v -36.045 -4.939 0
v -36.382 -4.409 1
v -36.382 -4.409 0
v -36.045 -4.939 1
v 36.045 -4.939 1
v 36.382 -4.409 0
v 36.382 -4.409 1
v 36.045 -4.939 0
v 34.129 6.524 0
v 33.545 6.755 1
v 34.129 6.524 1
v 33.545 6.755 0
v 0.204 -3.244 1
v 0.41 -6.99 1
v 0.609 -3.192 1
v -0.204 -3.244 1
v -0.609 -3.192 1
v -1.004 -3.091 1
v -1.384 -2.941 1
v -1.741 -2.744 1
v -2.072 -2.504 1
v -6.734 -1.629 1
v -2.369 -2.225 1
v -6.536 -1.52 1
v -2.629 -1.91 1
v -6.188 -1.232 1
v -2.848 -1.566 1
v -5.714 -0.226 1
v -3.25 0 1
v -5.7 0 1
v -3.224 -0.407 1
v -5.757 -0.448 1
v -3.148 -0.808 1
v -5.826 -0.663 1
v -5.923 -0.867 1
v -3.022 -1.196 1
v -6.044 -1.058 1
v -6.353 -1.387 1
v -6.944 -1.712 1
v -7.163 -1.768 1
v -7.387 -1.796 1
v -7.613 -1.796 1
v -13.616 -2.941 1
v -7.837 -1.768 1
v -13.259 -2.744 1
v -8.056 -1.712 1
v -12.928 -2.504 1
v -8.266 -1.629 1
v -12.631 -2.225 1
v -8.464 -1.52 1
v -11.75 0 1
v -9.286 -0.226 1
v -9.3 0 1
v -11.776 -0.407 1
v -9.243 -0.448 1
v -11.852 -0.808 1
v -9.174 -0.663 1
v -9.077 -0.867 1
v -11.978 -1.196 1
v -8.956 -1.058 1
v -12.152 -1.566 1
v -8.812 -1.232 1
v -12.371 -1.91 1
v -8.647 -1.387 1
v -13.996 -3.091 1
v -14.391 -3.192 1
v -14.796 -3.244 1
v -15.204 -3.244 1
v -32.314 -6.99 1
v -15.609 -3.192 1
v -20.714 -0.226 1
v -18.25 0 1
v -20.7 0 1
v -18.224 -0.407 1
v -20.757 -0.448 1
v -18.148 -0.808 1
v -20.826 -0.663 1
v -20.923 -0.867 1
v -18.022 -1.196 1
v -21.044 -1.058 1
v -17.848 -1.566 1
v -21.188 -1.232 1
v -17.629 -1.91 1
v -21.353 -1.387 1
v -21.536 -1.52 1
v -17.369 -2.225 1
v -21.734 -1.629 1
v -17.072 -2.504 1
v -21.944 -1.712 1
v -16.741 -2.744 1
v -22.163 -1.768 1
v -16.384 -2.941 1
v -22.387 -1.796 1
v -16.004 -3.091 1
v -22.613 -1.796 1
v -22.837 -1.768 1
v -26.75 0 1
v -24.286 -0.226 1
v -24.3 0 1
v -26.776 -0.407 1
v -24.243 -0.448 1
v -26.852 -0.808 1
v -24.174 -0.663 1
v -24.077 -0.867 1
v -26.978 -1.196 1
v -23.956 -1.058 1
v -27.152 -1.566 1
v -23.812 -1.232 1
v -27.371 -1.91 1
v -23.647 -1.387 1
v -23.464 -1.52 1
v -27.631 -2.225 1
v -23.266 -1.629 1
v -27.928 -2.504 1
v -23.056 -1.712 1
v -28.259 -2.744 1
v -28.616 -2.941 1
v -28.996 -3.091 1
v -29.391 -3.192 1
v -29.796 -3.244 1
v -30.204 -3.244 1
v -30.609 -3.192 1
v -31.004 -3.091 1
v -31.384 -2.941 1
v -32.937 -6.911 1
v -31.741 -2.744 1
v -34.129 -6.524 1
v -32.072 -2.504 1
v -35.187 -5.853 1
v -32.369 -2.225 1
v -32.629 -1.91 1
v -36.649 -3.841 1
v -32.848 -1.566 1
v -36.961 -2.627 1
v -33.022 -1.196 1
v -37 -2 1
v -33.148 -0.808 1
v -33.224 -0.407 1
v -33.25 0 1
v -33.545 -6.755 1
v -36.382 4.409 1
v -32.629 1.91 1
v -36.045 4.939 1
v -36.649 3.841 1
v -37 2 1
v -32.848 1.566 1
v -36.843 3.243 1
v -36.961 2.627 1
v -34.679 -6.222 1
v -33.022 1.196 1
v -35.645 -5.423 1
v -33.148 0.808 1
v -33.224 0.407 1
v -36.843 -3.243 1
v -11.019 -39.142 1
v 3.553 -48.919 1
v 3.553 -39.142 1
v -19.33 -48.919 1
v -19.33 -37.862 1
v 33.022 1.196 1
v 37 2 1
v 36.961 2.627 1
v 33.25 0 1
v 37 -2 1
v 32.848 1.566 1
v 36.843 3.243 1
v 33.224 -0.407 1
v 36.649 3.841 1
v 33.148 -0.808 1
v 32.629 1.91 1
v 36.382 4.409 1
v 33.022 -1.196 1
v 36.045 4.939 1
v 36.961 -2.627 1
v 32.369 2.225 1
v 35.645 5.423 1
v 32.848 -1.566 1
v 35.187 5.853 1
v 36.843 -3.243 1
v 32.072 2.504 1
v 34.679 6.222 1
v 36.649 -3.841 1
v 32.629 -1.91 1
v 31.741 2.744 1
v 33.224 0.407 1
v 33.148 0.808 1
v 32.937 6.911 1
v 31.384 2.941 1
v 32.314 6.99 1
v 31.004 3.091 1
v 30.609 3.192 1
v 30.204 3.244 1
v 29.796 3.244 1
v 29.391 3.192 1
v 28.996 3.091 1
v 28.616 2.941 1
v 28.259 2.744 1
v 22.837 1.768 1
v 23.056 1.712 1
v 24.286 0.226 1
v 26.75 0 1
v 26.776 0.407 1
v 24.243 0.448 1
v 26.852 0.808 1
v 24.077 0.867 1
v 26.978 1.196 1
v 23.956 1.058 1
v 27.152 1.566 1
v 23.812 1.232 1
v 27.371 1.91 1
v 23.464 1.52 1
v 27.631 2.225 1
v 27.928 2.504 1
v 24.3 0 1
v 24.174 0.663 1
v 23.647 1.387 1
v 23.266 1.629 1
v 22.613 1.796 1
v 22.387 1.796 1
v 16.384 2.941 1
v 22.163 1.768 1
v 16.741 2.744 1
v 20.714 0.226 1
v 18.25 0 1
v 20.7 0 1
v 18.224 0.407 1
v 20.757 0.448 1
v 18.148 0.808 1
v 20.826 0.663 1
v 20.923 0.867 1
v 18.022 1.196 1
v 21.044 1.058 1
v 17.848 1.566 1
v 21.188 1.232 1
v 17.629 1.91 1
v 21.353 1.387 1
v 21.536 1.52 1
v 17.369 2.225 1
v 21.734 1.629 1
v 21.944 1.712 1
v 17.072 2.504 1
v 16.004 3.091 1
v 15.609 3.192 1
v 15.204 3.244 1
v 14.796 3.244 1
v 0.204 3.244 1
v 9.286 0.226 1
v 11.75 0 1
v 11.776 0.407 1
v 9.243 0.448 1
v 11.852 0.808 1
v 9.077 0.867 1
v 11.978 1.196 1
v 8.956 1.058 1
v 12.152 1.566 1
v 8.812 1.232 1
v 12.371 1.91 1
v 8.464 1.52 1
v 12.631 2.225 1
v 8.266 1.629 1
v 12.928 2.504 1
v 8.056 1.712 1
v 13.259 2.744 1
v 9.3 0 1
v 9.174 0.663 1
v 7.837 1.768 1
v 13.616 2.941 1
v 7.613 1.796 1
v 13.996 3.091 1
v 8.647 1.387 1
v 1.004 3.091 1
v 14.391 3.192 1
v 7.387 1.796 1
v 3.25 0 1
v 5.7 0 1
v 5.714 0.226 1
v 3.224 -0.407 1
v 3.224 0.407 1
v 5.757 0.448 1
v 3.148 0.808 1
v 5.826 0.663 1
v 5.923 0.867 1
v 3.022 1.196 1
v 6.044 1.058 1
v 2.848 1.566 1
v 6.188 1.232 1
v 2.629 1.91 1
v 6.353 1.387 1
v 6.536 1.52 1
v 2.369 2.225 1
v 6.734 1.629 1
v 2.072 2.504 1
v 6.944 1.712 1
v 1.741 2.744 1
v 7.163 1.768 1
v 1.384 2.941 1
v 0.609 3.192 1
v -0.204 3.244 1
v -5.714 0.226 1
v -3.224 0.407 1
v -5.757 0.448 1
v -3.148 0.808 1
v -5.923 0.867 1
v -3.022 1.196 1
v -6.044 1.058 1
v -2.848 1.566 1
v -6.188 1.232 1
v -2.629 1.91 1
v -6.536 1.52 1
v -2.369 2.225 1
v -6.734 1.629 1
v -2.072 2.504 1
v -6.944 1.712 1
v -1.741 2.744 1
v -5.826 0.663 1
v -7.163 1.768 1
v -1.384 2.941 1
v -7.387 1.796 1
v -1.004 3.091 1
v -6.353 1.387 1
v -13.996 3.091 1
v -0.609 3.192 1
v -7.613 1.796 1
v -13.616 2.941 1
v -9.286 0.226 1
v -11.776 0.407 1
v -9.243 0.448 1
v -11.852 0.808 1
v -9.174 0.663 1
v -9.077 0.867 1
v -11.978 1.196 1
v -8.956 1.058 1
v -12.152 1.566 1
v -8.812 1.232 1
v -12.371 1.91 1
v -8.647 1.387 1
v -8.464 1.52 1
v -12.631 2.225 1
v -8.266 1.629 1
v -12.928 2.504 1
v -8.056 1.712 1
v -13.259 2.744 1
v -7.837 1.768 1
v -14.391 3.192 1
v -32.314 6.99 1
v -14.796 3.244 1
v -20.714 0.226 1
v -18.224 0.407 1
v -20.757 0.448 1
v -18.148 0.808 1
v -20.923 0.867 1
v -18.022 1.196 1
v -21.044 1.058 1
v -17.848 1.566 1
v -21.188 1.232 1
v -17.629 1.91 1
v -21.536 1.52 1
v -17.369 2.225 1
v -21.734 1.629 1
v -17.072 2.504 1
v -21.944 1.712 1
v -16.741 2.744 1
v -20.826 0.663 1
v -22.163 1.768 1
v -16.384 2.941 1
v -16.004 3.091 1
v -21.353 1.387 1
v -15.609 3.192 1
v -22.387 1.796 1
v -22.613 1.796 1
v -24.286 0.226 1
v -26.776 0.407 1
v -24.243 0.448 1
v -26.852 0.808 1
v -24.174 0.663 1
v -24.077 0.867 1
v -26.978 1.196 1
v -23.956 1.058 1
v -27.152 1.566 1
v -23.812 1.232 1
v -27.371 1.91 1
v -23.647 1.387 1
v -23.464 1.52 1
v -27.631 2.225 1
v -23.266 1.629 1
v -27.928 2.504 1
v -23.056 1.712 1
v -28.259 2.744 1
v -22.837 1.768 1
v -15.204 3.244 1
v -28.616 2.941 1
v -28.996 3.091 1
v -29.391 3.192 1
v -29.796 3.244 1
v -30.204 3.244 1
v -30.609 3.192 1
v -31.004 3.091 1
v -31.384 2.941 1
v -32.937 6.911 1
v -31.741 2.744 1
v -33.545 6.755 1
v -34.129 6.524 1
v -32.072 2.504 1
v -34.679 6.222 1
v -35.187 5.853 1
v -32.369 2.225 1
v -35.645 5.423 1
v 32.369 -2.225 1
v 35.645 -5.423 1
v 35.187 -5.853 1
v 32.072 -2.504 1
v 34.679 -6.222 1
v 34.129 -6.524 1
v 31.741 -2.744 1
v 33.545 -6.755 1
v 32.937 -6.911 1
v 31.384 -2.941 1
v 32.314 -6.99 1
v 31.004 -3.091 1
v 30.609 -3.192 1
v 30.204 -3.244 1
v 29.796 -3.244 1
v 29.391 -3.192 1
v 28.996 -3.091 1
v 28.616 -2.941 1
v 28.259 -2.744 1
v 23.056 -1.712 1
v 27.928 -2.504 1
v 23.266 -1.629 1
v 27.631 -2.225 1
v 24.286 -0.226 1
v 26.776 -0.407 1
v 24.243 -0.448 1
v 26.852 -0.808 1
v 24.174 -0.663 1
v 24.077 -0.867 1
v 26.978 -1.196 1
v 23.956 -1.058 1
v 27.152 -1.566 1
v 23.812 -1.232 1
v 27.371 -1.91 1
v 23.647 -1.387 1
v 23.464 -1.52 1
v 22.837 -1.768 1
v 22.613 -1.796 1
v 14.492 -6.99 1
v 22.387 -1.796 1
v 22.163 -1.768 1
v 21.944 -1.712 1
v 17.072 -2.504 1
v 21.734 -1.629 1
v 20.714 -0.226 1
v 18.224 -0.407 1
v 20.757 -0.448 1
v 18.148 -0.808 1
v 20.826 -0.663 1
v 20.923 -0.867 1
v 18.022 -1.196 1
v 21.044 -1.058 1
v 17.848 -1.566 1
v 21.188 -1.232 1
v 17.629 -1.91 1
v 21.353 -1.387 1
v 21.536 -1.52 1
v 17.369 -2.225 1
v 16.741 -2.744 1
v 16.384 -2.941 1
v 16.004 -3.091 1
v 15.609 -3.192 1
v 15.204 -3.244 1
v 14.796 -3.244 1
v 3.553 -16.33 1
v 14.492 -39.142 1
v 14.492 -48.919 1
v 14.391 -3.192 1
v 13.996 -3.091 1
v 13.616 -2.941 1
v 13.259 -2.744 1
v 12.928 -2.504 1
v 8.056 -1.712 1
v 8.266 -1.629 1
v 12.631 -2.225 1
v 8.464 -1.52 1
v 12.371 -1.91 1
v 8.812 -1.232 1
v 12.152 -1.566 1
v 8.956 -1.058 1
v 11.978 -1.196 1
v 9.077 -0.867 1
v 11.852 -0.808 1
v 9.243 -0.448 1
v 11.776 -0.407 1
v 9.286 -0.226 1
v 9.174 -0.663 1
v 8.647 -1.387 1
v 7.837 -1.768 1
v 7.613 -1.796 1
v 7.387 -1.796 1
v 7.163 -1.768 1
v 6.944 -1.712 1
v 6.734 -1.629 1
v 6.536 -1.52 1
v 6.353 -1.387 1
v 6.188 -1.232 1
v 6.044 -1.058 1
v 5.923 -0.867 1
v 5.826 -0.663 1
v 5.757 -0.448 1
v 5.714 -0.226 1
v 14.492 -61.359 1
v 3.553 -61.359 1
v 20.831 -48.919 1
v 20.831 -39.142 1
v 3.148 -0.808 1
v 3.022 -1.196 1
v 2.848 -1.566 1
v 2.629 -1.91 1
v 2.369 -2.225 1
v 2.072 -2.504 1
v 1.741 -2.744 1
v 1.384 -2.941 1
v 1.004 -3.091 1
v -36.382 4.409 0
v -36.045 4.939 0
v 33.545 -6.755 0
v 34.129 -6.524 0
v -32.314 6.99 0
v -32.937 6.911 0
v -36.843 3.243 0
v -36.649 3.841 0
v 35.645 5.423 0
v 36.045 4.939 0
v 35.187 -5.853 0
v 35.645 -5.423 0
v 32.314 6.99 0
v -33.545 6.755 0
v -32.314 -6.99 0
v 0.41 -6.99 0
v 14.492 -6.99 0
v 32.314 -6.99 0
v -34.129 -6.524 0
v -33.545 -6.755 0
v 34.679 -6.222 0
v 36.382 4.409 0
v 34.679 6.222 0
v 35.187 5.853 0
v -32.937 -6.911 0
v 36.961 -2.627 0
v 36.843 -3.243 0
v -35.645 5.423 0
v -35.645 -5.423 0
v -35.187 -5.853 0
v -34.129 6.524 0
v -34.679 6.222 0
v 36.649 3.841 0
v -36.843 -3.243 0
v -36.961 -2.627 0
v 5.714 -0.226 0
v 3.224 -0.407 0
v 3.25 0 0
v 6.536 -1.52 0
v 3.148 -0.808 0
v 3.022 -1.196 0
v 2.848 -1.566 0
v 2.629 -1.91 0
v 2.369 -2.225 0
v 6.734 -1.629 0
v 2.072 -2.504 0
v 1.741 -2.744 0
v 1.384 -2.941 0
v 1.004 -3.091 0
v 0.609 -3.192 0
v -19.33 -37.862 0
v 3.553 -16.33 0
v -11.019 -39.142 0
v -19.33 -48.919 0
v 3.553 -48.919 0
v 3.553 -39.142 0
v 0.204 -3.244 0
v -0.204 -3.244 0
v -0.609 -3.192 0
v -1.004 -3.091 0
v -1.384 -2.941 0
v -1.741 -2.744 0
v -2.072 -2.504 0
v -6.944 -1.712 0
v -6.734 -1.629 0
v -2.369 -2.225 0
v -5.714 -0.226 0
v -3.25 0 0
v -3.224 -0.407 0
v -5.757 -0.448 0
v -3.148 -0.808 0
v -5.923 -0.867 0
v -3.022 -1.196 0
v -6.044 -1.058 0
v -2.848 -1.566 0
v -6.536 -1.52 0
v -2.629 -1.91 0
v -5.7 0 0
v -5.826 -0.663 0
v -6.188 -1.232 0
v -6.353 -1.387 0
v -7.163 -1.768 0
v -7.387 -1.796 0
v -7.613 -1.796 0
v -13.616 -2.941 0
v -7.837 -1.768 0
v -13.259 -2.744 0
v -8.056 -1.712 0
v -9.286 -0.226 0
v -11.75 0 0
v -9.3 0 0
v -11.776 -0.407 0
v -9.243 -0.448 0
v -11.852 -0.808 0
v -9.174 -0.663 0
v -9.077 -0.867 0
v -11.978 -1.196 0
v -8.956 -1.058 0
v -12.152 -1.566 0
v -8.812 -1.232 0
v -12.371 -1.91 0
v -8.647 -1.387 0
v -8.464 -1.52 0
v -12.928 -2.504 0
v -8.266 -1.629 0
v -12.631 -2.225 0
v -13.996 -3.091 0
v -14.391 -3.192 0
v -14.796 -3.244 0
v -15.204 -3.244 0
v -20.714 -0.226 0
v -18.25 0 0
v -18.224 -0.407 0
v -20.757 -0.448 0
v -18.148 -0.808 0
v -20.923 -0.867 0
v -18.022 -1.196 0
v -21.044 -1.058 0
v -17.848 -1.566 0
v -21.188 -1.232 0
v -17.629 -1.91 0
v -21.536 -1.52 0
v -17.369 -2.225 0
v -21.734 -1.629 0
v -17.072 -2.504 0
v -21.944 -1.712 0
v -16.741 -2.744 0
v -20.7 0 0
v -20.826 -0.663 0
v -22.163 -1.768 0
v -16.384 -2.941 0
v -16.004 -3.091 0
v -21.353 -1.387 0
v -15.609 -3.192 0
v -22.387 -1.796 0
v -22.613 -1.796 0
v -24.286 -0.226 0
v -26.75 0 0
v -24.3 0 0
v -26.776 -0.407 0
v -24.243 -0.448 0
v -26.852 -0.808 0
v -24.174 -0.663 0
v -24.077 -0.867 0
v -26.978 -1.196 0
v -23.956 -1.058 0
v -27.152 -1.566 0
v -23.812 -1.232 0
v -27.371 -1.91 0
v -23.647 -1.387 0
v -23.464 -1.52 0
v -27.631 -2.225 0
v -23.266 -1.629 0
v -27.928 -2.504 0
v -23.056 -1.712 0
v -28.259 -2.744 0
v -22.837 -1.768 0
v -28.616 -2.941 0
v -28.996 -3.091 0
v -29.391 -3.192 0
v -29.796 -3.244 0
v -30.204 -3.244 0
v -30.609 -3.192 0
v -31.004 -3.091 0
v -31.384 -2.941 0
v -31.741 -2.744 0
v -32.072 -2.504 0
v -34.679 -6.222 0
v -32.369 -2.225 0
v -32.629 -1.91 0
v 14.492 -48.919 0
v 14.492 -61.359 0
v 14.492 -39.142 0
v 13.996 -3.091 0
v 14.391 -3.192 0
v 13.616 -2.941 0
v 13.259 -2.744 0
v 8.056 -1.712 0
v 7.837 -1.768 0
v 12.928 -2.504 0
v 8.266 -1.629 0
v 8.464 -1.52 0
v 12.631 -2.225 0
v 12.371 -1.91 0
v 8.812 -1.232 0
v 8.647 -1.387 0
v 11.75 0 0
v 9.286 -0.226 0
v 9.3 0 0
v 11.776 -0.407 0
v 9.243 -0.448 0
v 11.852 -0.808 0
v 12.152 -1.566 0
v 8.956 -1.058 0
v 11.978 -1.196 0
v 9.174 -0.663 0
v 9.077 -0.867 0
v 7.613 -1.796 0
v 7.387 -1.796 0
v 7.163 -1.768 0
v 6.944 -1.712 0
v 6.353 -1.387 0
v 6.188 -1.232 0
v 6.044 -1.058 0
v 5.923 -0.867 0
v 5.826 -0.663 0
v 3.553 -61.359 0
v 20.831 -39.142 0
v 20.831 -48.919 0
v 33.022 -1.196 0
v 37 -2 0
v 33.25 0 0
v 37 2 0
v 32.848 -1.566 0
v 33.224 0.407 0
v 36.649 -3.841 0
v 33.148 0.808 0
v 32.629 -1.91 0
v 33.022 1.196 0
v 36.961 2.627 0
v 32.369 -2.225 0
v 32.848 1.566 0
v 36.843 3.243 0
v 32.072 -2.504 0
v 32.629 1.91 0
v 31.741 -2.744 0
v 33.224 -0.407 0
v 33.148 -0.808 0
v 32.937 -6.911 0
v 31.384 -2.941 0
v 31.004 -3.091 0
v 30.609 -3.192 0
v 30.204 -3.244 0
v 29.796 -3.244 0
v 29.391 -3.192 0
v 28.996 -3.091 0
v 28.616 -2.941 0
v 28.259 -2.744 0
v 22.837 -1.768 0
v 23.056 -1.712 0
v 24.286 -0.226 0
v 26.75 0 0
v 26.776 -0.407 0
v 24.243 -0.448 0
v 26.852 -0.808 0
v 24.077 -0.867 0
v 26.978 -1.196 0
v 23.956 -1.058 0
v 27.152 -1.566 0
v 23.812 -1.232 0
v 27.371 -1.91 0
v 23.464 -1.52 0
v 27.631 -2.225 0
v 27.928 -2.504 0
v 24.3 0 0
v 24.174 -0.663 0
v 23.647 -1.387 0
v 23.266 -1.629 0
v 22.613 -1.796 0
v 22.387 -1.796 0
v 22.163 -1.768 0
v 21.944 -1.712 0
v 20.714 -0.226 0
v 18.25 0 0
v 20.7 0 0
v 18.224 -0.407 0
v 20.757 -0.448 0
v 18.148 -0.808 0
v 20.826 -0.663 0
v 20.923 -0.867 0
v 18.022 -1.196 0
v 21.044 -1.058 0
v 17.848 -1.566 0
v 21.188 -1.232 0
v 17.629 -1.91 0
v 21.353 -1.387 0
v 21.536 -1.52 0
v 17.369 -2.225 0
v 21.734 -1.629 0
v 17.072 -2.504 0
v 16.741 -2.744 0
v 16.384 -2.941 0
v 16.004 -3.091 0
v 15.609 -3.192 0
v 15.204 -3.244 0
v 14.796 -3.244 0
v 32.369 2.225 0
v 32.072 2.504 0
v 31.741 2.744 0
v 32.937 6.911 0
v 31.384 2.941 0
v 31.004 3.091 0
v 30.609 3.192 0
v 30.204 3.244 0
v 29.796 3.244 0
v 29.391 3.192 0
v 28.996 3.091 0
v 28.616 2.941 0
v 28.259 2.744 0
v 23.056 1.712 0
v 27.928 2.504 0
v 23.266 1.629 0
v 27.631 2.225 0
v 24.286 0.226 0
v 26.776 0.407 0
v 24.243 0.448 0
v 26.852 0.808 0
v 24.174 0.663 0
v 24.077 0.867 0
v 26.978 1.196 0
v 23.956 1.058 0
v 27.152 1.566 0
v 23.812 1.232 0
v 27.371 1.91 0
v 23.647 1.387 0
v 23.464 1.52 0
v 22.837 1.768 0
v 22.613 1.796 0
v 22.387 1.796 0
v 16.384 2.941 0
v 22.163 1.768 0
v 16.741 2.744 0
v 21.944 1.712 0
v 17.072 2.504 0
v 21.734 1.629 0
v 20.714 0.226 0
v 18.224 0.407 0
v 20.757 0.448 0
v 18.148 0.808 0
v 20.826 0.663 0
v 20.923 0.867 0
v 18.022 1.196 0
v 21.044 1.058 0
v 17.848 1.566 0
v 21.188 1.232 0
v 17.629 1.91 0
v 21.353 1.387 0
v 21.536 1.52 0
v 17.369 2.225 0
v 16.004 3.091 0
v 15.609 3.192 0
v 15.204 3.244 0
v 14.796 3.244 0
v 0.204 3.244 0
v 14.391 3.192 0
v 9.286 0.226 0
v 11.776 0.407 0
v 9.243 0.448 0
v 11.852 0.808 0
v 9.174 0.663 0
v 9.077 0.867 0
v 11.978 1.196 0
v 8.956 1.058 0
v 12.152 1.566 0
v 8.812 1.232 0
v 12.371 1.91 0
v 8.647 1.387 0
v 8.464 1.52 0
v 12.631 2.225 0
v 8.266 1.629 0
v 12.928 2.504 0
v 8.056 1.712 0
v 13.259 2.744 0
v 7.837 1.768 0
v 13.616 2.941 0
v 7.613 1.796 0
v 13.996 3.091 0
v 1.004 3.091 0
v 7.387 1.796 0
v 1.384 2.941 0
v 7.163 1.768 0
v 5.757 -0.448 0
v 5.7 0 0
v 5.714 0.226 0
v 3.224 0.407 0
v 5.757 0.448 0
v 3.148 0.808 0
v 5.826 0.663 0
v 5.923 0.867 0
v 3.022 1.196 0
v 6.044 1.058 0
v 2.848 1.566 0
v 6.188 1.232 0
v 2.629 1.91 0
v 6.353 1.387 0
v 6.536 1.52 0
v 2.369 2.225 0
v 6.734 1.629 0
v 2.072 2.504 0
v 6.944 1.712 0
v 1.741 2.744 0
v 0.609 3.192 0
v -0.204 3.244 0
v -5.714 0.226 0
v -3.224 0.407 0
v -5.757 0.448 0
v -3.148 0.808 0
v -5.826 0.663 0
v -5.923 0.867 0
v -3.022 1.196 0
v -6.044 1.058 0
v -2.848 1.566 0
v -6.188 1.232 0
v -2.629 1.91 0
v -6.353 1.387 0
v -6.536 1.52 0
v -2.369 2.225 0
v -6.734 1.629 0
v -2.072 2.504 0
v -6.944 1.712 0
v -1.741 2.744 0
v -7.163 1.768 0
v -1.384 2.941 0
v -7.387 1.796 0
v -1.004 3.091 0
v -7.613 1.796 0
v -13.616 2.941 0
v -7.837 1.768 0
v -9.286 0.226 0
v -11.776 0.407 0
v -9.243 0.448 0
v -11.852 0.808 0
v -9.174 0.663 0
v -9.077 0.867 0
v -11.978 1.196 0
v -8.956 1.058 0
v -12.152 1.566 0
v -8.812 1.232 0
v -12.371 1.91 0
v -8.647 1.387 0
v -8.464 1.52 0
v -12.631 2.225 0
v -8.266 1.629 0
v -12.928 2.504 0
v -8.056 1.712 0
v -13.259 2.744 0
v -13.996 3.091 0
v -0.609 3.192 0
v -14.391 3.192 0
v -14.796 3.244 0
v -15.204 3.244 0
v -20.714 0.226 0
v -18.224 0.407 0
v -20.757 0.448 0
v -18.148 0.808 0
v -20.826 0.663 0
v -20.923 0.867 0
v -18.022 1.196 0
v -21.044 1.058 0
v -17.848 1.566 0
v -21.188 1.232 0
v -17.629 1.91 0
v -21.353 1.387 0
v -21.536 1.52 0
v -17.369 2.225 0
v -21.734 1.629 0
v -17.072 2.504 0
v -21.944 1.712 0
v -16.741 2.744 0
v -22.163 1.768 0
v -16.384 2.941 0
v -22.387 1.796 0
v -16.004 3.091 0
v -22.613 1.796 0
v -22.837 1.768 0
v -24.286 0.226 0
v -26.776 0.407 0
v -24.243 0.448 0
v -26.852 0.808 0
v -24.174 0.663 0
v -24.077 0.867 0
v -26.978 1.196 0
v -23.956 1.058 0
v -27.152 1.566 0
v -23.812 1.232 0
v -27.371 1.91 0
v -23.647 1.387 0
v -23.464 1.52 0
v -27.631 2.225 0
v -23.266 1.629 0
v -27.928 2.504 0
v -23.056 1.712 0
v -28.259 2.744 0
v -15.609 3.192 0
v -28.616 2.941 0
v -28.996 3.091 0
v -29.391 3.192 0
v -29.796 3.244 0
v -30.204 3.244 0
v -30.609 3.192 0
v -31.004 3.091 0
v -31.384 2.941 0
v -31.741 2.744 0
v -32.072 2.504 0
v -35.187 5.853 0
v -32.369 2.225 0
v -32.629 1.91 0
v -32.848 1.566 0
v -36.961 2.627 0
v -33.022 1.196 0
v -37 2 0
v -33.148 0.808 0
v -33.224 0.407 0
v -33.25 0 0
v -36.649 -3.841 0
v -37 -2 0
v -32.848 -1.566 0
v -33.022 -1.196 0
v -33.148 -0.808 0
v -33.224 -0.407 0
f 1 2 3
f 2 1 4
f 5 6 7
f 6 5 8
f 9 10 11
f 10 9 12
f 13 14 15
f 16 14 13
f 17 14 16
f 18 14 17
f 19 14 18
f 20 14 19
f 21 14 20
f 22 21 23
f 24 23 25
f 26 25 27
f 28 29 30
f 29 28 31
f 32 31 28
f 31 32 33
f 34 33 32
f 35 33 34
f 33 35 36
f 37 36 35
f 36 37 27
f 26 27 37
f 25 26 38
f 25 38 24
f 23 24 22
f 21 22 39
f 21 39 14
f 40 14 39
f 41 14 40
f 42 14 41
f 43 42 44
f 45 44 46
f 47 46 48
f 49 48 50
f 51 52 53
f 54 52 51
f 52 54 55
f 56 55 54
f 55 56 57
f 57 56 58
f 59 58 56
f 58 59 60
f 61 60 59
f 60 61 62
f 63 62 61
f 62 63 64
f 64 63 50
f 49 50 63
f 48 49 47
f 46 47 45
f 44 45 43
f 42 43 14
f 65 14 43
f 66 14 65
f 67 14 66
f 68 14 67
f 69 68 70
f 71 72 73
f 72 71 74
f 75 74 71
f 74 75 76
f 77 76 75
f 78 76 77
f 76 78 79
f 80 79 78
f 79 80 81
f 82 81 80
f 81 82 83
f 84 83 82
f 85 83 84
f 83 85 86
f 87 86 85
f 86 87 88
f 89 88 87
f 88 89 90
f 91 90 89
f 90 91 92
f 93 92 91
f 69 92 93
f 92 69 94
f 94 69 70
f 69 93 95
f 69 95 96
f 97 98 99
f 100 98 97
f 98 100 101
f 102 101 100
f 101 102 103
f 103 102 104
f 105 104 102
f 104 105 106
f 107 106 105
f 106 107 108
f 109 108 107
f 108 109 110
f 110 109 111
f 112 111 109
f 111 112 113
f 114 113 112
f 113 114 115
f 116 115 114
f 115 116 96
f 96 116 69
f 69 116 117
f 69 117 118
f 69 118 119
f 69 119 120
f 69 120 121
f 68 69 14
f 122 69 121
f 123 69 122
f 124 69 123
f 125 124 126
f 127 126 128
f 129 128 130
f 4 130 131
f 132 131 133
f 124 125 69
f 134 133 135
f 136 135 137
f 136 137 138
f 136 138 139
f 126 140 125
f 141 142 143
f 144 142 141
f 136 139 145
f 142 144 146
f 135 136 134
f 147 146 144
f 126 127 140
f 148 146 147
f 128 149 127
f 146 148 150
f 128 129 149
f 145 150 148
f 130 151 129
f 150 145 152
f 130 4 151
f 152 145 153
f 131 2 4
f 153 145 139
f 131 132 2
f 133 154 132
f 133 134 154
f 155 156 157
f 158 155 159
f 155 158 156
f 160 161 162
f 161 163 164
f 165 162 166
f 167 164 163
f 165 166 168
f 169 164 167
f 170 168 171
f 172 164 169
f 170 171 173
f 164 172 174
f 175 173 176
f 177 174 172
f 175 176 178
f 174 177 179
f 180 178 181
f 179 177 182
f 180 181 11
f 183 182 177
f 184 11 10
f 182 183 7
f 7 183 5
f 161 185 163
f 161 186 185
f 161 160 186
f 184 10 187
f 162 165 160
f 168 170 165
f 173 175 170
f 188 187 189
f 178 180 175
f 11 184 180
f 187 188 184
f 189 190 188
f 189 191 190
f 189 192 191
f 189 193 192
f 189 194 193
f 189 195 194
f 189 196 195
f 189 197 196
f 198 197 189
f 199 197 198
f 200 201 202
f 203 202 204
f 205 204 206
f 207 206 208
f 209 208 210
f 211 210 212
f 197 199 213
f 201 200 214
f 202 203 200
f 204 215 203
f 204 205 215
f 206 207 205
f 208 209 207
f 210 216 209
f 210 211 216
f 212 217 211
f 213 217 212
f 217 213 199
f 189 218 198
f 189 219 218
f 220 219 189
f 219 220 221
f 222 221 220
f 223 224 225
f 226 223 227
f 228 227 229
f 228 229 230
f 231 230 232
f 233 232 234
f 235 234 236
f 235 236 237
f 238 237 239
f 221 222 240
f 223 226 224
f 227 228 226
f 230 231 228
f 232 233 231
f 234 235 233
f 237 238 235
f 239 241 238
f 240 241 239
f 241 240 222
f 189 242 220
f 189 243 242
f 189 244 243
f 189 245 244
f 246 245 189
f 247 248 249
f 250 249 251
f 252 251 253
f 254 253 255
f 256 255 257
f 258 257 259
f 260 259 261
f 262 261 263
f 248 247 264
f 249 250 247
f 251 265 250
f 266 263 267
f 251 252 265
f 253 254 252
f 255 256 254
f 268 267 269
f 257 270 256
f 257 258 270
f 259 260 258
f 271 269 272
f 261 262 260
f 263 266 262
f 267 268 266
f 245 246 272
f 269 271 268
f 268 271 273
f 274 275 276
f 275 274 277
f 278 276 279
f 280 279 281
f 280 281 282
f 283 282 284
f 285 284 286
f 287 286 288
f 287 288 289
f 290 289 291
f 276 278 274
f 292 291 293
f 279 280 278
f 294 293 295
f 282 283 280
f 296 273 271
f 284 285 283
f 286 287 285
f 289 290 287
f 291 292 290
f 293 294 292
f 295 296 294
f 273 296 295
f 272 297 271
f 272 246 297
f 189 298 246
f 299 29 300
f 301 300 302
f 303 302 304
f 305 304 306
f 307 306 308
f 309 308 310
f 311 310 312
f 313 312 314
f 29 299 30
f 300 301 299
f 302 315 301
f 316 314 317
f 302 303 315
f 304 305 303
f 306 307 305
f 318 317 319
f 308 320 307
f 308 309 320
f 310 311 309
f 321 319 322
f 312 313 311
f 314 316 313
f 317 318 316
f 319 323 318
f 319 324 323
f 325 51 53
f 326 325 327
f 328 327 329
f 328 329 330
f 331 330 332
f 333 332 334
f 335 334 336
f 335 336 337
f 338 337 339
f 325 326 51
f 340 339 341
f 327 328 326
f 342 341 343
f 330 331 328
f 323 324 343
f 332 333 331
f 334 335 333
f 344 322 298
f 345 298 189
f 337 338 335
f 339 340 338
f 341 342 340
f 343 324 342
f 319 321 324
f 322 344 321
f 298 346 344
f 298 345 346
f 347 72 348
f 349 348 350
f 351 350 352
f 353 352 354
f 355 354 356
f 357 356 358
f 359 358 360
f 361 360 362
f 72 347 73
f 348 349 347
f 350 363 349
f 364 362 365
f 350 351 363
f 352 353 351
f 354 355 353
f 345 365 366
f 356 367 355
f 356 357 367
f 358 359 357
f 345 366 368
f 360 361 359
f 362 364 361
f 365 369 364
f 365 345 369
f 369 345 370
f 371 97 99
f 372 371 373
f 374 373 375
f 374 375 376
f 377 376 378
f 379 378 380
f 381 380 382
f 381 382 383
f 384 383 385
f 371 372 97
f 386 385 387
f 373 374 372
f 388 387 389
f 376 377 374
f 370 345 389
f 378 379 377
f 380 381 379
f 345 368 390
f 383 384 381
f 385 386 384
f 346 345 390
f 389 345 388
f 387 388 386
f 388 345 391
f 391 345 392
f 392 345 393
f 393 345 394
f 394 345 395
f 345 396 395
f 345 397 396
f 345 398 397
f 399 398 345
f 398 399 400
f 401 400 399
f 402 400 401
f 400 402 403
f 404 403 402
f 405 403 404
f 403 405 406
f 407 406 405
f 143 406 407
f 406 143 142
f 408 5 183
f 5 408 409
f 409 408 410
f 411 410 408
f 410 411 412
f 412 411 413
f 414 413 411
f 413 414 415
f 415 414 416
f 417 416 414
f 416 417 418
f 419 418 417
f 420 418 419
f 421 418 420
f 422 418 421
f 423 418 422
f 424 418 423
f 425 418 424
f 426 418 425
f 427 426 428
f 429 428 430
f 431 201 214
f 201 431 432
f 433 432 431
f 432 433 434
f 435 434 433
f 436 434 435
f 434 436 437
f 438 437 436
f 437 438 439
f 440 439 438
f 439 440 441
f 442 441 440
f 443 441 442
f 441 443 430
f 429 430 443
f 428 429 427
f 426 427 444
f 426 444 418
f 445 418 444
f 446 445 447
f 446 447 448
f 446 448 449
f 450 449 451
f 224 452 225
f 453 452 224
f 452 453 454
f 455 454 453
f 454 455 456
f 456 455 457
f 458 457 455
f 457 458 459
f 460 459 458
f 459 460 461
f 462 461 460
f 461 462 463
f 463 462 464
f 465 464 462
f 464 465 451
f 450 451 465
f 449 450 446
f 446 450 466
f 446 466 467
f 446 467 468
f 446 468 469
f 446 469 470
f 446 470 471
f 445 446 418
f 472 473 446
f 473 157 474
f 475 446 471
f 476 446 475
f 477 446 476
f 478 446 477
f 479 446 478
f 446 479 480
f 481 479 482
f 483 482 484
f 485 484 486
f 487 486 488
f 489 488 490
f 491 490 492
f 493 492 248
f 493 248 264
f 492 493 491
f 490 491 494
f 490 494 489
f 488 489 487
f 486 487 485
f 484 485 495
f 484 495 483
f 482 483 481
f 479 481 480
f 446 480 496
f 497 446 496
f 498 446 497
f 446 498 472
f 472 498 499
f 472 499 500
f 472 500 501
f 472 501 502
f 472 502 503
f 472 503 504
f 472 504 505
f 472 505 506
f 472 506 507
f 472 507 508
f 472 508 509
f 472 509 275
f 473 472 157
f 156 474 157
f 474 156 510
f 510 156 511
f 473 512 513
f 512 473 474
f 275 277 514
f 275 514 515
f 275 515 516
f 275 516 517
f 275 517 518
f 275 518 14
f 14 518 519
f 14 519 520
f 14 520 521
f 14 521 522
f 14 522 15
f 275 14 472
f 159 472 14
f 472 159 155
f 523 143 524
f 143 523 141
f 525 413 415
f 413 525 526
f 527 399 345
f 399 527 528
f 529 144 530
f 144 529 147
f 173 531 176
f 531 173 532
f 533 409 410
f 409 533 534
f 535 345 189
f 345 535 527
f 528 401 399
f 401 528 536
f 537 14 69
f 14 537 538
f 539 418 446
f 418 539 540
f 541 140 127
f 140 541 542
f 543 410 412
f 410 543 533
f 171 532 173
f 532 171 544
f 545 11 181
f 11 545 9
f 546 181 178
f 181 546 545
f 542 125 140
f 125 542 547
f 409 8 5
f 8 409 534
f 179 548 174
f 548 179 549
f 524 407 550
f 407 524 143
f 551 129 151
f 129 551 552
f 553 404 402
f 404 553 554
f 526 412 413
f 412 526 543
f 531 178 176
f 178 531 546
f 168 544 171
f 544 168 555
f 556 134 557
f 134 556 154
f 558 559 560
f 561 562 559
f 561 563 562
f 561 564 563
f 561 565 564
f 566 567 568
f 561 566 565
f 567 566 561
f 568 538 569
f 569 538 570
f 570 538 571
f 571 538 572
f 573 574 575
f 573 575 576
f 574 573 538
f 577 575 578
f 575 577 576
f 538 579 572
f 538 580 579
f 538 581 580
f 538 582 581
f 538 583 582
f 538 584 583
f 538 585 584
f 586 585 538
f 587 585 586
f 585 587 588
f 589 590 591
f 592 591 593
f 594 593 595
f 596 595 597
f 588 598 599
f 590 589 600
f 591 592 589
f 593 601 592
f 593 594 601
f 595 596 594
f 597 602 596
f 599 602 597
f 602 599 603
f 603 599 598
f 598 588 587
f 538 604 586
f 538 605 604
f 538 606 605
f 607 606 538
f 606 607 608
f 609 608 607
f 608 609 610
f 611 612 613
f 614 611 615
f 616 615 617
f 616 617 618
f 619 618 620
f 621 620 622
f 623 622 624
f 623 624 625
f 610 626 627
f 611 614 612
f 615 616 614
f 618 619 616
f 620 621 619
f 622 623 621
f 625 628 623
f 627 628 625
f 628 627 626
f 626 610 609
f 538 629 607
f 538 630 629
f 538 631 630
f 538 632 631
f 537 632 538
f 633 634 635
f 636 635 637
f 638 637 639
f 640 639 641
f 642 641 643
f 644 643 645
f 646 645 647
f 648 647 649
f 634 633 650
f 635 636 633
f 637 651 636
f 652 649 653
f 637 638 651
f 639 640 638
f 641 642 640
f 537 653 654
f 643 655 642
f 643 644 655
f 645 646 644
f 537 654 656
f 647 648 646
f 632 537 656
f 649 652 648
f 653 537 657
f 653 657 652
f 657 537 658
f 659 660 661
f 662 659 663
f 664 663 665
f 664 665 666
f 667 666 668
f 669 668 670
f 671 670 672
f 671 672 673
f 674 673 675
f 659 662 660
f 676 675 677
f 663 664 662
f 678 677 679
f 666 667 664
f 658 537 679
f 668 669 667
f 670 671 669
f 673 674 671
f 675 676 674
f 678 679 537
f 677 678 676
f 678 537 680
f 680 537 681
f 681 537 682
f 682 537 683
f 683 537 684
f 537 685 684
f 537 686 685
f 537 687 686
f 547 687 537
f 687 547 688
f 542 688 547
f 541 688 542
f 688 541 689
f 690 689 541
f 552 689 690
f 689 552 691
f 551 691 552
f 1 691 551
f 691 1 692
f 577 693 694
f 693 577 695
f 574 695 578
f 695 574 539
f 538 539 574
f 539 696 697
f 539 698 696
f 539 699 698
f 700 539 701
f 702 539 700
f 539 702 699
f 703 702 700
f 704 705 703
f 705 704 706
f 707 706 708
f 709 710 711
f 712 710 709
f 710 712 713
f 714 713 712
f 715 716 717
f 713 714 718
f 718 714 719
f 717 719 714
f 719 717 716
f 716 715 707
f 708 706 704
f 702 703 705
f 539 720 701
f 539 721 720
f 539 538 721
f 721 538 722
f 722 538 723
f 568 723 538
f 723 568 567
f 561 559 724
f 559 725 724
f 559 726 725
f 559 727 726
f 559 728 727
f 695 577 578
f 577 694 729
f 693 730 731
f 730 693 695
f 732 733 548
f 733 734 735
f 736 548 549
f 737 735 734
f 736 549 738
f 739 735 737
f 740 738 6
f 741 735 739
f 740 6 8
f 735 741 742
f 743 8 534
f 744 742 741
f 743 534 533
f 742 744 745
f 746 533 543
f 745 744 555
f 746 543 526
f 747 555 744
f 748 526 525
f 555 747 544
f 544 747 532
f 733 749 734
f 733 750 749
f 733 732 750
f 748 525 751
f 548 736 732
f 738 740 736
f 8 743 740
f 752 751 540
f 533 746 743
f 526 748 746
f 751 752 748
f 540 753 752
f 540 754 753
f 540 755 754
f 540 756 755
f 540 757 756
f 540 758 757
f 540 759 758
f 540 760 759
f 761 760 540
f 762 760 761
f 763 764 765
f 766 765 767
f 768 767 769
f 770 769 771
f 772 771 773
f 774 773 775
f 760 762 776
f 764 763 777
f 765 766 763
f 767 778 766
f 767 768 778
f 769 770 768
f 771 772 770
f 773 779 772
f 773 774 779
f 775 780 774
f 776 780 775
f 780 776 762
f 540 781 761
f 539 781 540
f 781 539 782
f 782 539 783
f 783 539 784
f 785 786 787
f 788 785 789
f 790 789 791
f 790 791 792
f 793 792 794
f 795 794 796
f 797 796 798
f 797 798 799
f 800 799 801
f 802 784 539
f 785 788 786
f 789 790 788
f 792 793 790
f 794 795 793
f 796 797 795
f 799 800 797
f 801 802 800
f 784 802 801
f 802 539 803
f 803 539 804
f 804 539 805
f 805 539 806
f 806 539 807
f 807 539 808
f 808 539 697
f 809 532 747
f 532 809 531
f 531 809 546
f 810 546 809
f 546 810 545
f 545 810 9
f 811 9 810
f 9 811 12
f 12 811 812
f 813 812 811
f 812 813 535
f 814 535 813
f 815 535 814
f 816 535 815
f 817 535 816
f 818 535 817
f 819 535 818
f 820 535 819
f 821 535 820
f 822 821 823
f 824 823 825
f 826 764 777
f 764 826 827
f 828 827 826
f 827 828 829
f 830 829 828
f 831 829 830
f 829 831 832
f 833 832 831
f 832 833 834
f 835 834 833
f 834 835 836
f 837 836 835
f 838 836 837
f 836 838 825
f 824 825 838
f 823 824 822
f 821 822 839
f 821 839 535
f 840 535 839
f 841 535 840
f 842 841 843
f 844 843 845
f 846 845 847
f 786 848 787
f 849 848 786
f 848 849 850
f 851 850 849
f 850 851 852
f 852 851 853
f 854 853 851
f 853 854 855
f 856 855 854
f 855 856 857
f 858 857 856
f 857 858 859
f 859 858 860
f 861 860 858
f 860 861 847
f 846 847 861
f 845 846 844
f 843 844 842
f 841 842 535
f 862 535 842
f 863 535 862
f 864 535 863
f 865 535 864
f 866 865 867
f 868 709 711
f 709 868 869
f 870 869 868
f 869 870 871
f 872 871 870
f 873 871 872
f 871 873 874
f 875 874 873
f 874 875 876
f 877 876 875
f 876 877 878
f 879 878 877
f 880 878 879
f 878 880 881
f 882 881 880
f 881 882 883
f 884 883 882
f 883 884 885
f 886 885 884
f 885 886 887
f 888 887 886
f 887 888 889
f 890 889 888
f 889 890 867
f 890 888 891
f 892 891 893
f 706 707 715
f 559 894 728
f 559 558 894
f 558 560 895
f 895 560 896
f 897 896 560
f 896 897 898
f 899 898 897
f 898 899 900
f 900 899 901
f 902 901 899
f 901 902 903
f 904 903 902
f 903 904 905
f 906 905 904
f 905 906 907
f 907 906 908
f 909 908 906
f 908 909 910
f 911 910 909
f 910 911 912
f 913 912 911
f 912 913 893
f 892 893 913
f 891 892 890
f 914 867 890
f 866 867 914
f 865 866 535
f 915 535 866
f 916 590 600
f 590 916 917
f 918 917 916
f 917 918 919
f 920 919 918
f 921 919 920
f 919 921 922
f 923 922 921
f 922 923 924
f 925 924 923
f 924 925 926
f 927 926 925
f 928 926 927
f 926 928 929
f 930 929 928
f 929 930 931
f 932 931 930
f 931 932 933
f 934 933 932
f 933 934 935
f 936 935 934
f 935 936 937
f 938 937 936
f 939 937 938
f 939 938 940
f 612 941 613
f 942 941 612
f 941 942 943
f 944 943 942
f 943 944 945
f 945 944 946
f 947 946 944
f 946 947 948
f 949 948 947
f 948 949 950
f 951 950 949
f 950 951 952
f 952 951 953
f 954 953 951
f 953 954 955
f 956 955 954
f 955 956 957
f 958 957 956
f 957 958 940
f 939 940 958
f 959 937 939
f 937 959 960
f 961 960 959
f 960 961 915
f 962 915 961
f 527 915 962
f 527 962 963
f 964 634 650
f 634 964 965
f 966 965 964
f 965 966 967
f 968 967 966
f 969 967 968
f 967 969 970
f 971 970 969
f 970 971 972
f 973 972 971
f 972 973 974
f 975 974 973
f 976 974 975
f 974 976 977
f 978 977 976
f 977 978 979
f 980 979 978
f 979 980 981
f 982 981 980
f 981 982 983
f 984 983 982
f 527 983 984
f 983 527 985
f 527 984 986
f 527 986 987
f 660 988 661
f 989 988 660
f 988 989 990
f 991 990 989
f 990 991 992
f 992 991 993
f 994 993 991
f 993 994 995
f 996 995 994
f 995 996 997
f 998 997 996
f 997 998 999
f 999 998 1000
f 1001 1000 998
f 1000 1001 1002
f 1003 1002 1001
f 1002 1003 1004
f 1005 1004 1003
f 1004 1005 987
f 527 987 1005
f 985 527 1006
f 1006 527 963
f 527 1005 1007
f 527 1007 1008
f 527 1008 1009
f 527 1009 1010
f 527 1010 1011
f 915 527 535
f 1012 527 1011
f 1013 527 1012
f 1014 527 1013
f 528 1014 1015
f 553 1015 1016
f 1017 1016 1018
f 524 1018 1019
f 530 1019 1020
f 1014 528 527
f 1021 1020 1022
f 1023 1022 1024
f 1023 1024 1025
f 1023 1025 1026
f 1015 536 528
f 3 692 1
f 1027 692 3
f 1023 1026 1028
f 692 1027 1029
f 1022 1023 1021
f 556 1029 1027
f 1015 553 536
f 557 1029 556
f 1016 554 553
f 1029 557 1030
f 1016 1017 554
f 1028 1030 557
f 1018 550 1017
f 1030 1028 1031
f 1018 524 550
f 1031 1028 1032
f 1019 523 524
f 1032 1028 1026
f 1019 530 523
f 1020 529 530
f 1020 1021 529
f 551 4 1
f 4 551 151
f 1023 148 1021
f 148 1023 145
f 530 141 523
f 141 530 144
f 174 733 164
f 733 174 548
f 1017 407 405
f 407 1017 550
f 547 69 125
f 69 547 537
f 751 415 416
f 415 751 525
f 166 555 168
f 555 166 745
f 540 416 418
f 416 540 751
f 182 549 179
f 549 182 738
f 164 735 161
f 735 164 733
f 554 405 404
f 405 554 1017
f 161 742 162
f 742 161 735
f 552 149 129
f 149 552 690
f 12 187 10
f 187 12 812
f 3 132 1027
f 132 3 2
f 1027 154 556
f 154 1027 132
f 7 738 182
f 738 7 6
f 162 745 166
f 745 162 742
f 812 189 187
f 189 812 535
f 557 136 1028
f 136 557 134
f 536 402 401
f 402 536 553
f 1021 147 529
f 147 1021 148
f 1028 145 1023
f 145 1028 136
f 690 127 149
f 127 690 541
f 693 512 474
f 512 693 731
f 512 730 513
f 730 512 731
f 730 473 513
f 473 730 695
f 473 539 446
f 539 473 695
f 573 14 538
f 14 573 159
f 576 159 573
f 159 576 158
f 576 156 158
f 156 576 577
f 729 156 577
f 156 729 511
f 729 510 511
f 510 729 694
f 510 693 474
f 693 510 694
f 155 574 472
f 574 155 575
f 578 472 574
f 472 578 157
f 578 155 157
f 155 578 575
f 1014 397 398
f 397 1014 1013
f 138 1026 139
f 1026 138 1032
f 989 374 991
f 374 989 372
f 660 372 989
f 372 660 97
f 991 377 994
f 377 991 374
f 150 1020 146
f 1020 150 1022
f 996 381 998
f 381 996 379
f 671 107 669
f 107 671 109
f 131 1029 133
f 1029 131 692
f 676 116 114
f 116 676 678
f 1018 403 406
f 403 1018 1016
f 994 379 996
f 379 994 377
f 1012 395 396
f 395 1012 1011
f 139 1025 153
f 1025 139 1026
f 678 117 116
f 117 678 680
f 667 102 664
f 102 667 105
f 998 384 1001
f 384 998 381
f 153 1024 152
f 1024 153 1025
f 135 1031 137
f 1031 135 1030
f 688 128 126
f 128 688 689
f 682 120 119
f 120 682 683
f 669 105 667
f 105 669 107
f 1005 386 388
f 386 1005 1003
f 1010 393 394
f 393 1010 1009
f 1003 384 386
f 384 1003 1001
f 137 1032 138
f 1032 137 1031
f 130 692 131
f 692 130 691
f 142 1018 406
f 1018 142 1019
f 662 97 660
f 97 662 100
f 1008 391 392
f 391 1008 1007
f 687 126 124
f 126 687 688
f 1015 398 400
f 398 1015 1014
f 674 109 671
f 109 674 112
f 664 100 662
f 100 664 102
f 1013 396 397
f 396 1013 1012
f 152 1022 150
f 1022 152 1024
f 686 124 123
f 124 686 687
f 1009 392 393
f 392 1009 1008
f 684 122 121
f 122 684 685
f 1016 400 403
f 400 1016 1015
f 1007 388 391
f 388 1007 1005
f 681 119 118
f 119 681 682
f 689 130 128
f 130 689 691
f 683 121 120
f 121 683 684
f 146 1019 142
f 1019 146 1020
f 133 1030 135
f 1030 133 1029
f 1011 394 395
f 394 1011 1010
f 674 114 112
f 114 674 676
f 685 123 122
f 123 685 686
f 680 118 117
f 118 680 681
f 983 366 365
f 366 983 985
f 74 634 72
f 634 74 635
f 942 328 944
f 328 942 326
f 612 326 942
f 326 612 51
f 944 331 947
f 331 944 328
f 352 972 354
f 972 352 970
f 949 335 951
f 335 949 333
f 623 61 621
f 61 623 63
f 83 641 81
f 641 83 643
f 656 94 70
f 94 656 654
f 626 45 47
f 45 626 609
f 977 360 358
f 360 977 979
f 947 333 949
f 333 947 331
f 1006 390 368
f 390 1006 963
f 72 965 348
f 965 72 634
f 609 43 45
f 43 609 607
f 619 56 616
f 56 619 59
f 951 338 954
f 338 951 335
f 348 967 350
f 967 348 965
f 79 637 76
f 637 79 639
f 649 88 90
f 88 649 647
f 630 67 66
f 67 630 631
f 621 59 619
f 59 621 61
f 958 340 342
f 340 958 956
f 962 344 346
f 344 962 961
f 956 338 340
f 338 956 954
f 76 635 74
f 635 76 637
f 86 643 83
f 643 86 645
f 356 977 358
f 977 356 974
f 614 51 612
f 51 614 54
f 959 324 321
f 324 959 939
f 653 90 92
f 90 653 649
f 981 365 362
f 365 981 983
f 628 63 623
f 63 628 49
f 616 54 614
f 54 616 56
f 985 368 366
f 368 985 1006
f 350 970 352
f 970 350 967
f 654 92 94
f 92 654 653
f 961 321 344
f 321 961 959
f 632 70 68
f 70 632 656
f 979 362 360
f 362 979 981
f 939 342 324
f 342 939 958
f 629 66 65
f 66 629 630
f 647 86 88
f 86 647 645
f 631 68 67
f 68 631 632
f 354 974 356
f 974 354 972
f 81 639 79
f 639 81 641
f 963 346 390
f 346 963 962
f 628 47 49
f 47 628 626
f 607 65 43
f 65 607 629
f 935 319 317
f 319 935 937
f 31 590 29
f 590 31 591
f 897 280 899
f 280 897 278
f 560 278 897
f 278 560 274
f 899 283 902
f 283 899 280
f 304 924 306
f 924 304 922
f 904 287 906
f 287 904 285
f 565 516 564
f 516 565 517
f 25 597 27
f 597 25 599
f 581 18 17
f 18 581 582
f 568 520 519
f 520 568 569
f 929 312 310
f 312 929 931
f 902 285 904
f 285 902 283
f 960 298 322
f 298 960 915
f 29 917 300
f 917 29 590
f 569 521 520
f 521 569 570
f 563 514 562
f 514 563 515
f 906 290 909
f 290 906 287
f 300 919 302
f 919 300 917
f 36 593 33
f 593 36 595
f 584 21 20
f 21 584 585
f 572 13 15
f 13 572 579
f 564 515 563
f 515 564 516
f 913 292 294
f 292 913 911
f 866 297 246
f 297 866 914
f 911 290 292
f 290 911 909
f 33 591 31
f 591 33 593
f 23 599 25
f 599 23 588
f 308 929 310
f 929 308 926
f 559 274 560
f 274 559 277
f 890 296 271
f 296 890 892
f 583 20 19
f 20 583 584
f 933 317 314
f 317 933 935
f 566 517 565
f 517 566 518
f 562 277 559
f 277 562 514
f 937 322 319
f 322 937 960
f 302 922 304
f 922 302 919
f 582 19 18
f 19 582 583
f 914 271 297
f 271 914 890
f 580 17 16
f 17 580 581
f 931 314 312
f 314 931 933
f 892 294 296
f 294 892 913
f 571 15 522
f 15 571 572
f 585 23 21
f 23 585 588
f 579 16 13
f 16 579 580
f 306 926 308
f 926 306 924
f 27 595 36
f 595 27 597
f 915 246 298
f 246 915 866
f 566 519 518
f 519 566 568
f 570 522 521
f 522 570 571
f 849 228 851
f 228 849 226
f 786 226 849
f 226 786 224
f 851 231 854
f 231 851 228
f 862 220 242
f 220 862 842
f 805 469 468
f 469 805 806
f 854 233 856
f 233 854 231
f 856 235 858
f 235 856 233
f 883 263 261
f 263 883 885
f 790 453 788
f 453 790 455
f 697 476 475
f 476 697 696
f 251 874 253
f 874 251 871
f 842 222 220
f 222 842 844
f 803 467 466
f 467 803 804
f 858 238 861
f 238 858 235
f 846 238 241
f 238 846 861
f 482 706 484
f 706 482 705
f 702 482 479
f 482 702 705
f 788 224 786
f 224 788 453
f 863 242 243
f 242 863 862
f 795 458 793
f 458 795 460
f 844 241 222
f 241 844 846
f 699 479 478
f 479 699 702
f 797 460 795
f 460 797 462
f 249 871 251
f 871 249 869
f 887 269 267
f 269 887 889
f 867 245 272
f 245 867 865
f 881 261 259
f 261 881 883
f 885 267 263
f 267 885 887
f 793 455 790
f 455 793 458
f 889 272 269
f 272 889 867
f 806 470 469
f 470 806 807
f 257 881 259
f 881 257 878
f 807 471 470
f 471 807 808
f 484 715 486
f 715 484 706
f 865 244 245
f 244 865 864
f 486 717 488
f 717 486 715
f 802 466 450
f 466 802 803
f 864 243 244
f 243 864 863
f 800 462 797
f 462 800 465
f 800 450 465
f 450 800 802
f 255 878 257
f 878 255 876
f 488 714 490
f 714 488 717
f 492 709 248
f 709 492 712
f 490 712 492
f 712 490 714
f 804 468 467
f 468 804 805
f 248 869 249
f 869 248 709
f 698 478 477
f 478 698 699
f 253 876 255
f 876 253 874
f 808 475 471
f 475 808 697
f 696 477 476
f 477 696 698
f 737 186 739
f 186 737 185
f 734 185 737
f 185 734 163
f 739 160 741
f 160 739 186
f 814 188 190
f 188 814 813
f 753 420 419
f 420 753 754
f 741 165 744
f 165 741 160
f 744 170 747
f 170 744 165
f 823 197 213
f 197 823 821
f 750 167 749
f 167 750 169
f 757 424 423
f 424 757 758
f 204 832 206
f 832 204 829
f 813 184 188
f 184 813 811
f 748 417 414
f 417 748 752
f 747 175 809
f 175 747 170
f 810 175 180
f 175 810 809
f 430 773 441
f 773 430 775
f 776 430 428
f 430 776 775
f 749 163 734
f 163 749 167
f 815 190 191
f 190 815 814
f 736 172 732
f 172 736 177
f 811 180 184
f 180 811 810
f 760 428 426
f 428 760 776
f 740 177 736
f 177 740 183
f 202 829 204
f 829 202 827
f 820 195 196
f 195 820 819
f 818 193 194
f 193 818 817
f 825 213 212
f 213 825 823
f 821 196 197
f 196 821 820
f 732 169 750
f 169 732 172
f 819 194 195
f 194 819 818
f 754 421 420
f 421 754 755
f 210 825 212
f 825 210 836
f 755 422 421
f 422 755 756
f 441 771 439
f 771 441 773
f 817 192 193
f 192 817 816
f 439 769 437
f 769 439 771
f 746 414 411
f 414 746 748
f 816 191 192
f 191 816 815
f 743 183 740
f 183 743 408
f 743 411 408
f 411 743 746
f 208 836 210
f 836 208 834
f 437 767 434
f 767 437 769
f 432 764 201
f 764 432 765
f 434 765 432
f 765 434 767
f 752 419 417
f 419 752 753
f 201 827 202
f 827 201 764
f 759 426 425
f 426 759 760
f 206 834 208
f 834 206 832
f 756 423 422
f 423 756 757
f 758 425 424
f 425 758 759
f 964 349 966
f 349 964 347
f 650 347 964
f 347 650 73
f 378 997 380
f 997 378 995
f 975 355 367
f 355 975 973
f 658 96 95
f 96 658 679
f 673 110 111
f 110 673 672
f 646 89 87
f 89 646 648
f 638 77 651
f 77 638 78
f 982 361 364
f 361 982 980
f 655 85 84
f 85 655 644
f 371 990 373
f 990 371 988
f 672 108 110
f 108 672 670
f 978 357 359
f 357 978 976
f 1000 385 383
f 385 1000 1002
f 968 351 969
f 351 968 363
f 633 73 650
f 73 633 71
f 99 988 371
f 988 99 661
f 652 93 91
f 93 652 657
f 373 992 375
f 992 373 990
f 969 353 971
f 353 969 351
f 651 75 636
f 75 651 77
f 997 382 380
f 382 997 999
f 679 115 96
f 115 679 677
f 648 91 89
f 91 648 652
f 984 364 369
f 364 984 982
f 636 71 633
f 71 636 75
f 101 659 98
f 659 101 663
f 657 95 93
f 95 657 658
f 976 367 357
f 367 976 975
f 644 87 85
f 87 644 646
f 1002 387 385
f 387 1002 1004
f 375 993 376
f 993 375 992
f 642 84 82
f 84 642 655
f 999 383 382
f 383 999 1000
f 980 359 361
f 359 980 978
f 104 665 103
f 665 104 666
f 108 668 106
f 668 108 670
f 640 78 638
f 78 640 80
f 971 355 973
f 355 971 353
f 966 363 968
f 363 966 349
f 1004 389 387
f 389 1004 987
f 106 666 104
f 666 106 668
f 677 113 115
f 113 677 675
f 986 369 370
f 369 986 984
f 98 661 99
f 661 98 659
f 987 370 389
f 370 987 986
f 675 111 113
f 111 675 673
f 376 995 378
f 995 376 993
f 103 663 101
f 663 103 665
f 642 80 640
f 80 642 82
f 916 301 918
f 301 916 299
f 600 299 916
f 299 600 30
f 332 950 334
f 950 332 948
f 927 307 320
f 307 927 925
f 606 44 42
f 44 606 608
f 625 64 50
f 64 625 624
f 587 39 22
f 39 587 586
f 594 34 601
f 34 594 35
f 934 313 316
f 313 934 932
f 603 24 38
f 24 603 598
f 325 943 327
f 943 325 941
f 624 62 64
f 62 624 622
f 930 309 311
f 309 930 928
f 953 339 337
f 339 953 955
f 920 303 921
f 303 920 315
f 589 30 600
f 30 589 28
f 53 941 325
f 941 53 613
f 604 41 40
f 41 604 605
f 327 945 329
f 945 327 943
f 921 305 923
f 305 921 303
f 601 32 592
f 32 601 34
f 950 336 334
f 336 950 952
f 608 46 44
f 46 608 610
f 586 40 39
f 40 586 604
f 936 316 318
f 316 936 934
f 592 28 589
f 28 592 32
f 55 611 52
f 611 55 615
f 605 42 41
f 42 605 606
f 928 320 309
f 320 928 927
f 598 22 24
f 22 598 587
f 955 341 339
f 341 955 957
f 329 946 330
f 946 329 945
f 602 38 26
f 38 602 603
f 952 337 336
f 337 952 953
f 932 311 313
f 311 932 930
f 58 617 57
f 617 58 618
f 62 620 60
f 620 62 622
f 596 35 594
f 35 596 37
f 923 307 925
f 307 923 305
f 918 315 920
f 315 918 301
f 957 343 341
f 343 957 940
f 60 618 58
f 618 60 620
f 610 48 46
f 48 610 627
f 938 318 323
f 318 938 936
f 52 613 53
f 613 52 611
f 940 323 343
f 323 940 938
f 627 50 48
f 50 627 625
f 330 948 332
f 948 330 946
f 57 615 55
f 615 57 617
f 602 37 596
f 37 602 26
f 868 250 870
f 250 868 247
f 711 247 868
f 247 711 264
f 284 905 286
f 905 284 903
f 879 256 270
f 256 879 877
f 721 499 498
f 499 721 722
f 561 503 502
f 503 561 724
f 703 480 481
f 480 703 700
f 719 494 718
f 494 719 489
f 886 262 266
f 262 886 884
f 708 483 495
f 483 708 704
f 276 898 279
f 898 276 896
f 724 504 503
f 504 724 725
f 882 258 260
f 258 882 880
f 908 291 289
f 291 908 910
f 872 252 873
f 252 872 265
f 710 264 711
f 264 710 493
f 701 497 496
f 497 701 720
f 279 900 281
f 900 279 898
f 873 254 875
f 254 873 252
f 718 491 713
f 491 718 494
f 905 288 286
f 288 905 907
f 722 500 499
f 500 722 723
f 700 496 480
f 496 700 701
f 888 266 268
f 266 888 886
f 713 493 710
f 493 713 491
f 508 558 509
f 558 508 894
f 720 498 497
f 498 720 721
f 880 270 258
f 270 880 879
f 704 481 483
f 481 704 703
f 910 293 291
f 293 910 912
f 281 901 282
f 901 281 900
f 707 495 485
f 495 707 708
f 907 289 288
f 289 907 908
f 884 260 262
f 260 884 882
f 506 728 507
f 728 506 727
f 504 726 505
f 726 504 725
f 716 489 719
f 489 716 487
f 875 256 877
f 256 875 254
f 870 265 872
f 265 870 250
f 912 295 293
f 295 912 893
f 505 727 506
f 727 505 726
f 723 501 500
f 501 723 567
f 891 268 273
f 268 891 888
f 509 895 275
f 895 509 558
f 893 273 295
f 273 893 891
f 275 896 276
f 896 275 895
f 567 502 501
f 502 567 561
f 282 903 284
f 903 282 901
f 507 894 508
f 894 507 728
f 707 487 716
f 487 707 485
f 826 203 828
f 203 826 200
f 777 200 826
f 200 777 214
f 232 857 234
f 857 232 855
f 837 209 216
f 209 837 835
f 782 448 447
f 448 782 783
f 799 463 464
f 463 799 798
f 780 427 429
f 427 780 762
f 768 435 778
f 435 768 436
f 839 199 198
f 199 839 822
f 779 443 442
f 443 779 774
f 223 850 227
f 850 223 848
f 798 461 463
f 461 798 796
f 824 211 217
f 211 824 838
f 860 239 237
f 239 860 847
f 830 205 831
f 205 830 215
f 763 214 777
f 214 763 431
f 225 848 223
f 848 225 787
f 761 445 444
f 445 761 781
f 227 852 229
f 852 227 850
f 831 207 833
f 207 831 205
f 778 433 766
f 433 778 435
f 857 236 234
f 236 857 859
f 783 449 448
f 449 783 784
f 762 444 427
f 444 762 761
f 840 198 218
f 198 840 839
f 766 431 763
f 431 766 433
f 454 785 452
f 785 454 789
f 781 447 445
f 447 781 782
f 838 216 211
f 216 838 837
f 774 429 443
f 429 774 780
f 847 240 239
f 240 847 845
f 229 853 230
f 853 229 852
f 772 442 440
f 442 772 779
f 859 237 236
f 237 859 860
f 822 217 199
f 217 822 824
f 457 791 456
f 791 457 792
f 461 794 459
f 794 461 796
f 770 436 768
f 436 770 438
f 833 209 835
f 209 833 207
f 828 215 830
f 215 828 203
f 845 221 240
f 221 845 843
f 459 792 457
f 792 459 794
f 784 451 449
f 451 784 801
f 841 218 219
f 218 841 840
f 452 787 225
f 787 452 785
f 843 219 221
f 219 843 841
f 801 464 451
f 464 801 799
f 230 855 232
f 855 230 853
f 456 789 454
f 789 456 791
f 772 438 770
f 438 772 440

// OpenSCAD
$fn = 50;


difference() {
	union() {
		*color(alpha = 1.0000000000, c = "gray") {
			translate(v = [0, 14, 0]) {
				linear_extrude(height = 1) {
					text(font = "Arial:style=Bold", halign = "center", size = 4.5000000000, text = "COMMENT description oobb_plate_shape_p_type_1_depth_5_width_1_thickness_4_extra_oobb_size", valign = "center");
				}
			}
		}
		hull() {
			translate(v = [-32.0000000000, 2.0000000000, 0]) {
				cylinder(h = 1, r = 5);
			}
			translate(v = [32.0000000000, 2.0000000000, 0]) {
				cylinder(h = 1, r = 5);
			}
			translate(v = [-32.0000000000, -2.0000000000, 0]) {
				cylinder(h = 1, r = 5);
			}
			translate(v = [32.0000000000, -2.0000000000, 0]) {
				cylinder(h = 1, r = 5);
			}
		}
		translate(v = [0, -5, 0]) {
			linear_extrude(height = 1) {
				text(font = "DejaVu Sans Mono:style=Bold", halign = "center", size = 57.0000000000, text = "4", valign = "top");
			}
		}
	}
	union() {
		*color(alpha = 1.0000000000, c = "gray") {
			translate(v = [0, 14, 0]) {
				linear_extrude(height = 1) {
					text(font = "Arial:style=Bold", halign = "center", size = 4.5000000000, text = "COMMENT description oobb_holes_shape_n_type_5_width_1_thickness_4_extra_oobb_size_1_height_'all'_holes_true_both_holes", valign = "center");
				}
			}
		}
		translate(v = [-30.0000000000, 0.0000000000, 0]) {
			translate(v = [0, 0, -50]) {
				cylinder(h = 100, r = 3.2500000000);
			}
		}
		translate(v = [-15.0000000000, 0.0000000000, 0]) {
			translate(v = [0, 0, -50]) {
				cylinder(h = 100, r = 3.2500000000);
			}
		}
		translate(v = [0, 0, -50]) {
			cylinder(h = 100, r = 3.2500000000);
		}
		translate(v = [15.0000000000, 0.0000000000, 0]) {
			translate(v = [0, 0, -50]) {
				cylinder(h = 100, r = 3.2500000000);
			}
		}
		translate(v = [30.0000000000, 0.0000000000, 0]) {
			translate(v = [0, 0, -50]) {
				cylinder(h = 100, r = 3.2500000000);
			}
		}
		translate(v = [-30.0000000000, 0.0000000000, 0]) {
			translate(v = [0, 0, -50]) {
				cylinder(h = 100, r = 1.8000000000);
			}
		}
		translate(v = [-22.5000000000, 0.0000000000, 0]) {
			translate(v = [0, 0, -50]) {
				cylinder(h = 100, r = 1.8000000000);
			}
		}
		translate(v = [-15.0000000000, 0.0000000000, 0]) {
			translate(v = [0, 0, -50]) {
				cylinder(h = 100, r = 1.8000000000);
			}
		}
		translate(v = [-7.5000000000, 0.0000000000, 0]) {
			translate(v = [0, 0, -50]) {
				cylinder(h = 100, r = 1.8000000000);
			}
		}
		translate(v = [0, 0, -50]) {
			cylinder(h = 100, r = 1.8000000000);
		}
		translate(v = [7.5000000000, 0.0000000000, 0]) {
			translate(v = [0, 0, -50]) {
				cylinder(h = 100, r = 1.8000000000);
			}
		}
		translate(v = [15.0000000000, 0.0000000000, 0]) {
			translate(v = [0, 0, -50]) {
				cylinder(h = 100, r = 1.8000000000);
			}
		}
		translate(v = [22.5000000000, 0.0000000000, 0]) {
			translate(v = [0, 0, -50]) {
				cylinder(h = 100, r = 1.8000000000);
			}
		}
		translate(v = [30.0000000000, 0.0000000000, 0]) {
			translate(v = [0, 0, -50]) {
				cylinder(h = 100, r = 1.8000000000);
			}
		}
	}
}
